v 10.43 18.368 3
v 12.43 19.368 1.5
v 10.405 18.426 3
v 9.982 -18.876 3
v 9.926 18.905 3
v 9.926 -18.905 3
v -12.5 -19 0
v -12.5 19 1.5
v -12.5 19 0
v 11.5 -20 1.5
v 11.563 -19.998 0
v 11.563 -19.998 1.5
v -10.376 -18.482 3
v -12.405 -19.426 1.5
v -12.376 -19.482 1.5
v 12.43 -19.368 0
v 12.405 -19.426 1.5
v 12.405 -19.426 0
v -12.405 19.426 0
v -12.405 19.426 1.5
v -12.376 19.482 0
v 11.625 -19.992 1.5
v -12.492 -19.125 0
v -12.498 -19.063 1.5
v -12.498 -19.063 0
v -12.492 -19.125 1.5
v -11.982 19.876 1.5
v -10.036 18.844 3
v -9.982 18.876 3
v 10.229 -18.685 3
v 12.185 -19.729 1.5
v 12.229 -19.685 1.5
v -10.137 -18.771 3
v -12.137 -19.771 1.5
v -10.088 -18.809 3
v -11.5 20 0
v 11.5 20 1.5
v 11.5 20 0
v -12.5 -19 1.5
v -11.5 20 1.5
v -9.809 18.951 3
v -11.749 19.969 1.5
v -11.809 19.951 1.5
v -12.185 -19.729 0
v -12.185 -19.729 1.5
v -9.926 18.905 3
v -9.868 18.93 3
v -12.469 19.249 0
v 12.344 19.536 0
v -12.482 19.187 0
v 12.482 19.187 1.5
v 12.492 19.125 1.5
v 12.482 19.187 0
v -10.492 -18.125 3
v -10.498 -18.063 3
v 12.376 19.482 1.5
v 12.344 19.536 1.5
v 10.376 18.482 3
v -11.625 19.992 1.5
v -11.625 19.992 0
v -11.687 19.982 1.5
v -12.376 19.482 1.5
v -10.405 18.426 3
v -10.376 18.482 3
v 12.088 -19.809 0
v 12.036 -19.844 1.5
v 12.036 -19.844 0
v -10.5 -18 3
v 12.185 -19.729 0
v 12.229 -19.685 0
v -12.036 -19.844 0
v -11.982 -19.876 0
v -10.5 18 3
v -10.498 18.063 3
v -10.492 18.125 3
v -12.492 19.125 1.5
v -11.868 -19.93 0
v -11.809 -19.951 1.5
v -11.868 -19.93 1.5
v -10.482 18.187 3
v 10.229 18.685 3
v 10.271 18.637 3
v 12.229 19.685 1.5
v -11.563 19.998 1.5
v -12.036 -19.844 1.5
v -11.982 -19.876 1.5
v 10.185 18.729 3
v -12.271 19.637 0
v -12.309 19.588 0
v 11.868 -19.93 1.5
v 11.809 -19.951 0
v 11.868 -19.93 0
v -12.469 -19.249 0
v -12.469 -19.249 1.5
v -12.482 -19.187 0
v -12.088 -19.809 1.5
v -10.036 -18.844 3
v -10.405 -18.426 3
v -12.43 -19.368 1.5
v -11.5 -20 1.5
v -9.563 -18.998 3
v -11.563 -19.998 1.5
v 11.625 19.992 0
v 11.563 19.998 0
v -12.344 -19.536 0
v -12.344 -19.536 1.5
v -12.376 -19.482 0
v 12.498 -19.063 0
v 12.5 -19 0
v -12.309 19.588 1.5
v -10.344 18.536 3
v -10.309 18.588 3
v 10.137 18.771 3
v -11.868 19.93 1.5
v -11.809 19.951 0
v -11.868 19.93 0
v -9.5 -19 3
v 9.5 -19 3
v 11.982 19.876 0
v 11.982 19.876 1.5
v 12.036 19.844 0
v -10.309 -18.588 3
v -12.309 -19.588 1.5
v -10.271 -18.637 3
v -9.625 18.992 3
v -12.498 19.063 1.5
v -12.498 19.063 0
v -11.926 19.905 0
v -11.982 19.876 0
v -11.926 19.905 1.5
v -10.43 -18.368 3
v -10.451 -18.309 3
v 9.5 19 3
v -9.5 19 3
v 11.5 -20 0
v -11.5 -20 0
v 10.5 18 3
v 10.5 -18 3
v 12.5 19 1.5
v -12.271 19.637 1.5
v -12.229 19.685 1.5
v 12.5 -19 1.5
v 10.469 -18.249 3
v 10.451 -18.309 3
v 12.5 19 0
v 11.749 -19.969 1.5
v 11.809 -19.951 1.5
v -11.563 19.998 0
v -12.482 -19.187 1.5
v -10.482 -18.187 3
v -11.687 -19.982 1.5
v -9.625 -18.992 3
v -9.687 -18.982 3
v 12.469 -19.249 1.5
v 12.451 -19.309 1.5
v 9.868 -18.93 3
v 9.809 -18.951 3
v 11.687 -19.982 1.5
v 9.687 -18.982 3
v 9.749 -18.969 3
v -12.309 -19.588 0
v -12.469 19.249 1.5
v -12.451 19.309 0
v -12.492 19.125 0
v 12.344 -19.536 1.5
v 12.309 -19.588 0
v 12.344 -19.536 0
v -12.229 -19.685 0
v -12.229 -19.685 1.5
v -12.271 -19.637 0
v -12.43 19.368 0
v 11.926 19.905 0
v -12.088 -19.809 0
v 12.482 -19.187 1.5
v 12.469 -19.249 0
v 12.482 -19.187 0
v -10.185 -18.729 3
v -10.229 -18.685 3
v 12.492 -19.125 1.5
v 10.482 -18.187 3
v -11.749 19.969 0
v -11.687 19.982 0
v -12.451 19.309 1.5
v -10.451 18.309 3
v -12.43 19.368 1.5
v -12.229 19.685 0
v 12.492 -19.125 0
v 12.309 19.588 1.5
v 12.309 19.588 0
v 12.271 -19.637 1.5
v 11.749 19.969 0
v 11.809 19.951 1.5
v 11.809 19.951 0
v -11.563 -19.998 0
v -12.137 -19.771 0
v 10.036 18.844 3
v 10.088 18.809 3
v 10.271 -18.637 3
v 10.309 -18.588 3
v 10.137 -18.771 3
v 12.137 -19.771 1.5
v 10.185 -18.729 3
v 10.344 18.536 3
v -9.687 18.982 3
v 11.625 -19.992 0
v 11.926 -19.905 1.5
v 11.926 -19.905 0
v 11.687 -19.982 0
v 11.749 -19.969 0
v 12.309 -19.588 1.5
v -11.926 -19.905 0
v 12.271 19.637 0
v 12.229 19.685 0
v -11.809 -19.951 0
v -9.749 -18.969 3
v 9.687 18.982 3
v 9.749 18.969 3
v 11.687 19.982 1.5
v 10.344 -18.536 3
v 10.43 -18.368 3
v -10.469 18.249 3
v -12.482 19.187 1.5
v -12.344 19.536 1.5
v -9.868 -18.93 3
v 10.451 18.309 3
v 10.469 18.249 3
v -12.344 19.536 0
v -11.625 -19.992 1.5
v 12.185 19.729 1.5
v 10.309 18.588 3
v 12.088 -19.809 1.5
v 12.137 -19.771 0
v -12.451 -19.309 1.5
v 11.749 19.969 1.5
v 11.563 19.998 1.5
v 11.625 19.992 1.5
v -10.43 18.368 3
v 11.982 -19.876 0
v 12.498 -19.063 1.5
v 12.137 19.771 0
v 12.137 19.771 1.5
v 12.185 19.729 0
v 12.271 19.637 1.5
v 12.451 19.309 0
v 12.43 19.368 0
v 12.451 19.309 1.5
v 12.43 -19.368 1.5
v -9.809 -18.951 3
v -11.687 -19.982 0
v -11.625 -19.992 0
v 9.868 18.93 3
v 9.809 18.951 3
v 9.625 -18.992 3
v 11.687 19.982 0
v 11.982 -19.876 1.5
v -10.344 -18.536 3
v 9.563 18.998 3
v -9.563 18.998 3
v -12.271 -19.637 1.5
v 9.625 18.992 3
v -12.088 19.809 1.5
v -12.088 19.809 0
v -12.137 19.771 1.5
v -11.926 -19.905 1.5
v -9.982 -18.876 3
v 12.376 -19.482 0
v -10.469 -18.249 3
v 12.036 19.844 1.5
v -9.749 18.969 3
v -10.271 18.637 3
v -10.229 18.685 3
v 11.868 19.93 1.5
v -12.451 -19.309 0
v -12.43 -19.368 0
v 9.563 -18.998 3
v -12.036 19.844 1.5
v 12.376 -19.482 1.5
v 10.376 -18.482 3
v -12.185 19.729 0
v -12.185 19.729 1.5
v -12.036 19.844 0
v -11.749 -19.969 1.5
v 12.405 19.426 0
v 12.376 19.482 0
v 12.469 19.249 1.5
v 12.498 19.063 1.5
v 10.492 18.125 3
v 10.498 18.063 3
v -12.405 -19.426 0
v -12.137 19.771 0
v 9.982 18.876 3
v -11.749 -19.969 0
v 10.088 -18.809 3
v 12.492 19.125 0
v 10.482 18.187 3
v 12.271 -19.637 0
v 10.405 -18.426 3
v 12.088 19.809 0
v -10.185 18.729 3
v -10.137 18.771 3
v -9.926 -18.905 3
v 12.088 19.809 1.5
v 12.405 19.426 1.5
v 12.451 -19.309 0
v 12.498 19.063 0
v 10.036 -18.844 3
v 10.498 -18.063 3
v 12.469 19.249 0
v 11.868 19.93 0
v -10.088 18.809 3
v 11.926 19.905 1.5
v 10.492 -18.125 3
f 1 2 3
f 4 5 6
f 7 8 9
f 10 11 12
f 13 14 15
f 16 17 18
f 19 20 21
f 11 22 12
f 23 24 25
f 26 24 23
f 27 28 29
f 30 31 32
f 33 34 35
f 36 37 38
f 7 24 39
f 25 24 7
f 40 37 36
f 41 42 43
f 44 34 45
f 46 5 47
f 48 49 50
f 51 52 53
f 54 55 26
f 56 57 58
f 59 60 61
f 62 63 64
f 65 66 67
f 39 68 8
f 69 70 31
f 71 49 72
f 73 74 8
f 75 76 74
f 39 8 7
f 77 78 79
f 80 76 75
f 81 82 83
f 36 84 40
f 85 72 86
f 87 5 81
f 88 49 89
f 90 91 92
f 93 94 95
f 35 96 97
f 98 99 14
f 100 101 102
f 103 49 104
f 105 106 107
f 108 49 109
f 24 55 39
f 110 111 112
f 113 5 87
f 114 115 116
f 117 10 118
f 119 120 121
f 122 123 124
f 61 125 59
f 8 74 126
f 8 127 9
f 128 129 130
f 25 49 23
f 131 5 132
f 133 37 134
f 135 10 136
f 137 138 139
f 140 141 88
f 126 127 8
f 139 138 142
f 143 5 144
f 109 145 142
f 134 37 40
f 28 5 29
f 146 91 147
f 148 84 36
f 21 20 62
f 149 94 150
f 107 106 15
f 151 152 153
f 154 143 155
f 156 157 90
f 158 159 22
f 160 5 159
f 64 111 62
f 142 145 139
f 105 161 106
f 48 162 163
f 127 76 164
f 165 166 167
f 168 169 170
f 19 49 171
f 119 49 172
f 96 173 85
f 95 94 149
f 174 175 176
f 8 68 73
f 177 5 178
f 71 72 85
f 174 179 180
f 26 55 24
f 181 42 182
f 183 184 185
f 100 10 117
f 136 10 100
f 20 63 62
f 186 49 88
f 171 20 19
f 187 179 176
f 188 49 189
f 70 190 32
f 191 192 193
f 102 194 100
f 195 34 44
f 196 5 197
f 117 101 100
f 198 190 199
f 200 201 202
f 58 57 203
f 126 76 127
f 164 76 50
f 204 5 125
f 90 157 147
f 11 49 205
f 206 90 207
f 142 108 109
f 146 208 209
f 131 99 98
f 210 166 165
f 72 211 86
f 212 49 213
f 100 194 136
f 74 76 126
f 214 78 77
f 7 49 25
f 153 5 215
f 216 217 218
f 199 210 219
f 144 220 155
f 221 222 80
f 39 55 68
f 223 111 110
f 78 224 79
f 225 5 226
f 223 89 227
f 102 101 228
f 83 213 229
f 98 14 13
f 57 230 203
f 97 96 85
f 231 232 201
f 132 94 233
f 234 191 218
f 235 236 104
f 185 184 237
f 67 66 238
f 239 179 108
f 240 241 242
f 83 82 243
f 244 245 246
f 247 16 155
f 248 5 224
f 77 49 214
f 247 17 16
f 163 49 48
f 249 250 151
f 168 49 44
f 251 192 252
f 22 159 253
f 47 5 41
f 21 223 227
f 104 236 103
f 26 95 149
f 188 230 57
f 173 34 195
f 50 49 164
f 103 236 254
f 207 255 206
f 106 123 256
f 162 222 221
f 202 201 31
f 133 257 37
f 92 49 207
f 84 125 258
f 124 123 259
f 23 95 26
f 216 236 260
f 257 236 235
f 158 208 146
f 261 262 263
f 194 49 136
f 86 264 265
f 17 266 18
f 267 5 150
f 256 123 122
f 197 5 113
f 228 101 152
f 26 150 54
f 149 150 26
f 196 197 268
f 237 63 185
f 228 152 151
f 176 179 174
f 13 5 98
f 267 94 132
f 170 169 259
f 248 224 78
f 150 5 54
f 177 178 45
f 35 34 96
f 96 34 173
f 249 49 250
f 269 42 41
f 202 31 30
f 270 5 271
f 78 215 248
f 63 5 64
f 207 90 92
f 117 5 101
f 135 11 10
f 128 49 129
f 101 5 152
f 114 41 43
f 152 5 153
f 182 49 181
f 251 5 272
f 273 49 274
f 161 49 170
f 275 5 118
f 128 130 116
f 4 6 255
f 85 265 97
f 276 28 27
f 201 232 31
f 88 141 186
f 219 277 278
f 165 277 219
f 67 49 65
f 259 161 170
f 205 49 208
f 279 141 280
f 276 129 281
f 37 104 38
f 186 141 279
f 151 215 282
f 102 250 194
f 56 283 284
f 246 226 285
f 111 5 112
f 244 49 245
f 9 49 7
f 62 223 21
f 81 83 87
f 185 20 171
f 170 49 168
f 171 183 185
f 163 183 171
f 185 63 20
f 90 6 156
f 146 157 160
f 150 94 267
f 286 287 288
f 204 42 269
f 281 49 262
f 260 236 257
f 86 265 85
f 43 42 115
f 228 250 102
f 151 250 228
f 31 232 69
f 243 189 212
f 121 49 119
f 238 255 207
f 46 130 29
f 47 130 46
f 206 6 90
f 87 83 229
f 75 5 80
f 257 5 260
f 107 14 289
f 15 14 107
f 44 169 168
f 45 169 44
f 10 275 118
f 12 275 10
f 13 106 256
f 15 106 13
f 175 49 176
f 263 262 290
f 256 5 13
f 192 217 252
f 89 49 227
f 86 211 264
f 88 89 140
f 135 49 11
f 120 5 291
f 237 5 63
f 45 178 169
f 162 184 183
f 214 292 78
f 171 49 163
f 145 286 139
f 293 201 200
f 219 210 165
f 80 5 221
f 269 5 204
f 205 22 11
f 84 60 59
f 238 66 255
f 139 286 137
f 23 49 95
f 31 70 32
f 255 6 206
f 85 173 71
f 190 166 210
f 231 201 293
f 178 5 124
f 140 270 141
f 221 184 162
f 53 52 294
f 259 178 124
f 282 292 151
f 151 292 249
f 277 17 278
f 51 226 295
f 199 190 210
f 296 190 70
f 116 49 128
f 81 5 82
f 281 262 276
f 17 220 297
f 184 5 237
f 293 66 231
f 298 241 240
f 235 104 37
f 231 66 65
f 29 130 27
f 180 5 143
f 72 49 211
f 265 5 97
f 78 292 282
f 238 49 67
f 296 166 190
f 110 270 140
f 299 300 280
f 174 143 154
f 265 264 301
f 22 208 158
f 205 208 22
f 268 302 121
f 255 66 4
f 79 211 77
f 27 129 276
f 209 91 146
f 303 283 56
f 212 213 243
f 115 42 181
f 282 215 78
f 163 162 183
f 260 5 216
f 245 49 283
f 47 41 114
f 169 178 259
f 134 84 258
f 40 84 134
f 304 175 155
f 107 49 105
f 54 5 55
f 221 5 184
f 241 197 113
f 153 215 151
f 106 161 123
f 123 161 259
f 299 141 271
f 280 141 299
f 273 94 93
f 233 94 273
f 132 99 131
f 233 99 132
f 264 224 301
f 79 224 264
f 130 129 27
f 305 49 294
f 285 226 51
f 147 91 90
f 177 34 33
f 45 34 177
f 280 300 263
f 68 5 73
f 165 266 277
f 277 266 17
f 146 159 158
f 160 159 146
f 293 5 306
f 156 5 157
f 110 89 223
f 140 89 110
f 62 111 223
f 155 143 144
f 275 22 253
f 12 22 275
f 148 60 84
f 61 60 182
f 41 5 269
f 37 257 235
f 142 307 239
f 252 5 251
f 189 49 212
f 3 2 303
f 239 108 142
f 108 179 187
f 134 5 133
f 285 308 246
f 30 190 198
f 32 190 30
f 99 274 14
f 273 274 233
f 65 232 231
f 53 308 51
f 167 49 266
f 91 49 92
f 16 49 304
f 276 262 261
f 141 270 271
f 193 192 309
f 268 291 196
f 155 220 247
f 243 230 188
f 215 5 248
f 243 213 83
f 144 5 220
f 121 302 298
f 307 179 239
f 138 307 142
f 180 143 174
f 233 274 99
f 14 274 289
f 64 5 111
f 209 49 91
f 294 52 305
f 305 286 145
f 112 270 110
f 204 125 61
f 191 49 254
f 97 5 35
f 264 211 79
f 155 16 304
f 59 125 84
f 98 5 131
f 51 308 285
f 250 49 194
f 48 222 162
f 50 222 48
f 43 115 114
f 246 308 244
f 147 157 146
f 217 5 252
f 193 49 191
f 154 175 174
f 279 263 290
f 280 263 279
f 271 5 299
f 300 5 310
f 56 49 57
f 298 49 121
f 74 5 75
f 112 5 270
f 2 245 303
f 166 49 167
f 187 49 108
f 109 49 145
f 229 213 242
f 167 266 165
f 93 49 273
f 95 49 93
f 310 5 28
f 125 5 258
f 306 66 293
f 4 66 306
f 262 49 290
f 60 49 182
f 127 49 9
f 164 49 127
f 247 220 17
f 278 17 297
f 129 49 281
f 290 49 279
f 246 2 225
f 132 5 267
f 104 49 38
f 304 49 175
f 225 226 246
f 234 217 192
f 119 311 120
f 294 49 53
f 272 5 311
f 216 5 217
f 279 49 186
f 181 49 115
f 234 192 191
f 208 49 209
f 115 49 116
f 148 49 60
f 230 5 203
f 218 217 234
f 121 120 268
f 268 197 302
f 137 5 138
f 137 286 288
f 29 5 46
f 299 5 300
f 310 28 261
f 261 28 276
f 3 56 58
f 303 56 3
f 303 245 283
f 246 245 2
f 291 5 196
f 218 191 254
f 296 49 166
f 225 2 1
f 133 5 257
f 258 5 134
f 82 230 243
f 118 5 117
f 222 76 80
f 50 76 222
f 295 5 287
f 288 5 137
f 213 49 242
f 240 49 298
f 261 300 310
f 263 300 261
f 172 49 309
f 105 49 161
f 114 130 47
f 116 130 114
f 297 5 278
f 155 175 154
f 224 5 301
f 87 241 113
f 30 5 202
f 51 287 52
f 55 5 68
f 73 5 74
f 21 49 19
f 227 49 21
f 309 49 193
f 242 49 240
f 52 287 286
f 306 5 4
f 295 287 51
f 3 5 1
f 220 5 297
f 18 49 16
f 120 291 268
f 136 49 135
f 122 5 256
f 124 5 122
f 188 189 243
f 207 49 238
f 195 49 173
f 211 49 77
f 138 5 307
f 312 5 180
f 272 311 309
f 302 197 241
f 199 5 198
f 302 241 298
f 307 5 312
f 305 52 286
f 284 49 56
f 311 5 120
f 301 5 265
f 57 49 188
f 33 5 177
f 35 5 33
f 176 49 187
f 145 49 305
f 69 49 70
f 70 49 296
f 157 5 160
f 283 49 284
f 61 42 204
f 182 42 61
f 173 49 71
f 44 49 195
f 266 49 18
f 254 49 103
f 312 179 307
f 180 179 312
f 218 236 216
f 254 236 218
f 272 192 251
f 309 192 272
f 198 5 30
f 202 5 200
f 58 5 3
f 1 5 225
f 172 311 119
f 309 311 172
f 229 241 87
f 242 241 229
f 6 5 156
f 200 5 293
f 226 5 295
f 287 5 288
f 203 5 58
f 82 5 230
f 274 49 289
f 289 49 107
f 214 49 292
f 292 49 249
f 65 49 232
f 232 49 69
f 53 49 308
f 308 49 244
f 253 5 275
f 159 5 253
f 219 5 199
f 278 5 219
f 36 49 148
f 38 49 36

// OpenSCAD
/**
 * Module: The box rim
 *
 * Features: configurable rim/rails, lid hooks/latches, and optional inner cell grids.
 *
 * Author: Karim Aziiev <karim.aziiev@gmail.com>
 * License: GPL-3.0-or-later
 */
use <../../lib/shapes2d.scad>

module rim(h1, h2, size_1, size_2, corner_rad, fn) {
  hull() {
    linear_extrude(height=h1, center=false, convexity=2) {
      rounded_rect(size_1, center=true, r=corner_rad, fn=fn);
    }
    translate([0, 0, h1]) {
      linear_extrude(height=h2, center=false, convexity=2) {
        rounded_rect(size_2, center=true, r=corner_rad, fn=fn);
      }
    }
  }
}

rim(h1=1.5,
    h2=1.5,
    size_1=[25, 40],
    size_2=[21, 38],
    corner_rad=1,
    fn=100);
